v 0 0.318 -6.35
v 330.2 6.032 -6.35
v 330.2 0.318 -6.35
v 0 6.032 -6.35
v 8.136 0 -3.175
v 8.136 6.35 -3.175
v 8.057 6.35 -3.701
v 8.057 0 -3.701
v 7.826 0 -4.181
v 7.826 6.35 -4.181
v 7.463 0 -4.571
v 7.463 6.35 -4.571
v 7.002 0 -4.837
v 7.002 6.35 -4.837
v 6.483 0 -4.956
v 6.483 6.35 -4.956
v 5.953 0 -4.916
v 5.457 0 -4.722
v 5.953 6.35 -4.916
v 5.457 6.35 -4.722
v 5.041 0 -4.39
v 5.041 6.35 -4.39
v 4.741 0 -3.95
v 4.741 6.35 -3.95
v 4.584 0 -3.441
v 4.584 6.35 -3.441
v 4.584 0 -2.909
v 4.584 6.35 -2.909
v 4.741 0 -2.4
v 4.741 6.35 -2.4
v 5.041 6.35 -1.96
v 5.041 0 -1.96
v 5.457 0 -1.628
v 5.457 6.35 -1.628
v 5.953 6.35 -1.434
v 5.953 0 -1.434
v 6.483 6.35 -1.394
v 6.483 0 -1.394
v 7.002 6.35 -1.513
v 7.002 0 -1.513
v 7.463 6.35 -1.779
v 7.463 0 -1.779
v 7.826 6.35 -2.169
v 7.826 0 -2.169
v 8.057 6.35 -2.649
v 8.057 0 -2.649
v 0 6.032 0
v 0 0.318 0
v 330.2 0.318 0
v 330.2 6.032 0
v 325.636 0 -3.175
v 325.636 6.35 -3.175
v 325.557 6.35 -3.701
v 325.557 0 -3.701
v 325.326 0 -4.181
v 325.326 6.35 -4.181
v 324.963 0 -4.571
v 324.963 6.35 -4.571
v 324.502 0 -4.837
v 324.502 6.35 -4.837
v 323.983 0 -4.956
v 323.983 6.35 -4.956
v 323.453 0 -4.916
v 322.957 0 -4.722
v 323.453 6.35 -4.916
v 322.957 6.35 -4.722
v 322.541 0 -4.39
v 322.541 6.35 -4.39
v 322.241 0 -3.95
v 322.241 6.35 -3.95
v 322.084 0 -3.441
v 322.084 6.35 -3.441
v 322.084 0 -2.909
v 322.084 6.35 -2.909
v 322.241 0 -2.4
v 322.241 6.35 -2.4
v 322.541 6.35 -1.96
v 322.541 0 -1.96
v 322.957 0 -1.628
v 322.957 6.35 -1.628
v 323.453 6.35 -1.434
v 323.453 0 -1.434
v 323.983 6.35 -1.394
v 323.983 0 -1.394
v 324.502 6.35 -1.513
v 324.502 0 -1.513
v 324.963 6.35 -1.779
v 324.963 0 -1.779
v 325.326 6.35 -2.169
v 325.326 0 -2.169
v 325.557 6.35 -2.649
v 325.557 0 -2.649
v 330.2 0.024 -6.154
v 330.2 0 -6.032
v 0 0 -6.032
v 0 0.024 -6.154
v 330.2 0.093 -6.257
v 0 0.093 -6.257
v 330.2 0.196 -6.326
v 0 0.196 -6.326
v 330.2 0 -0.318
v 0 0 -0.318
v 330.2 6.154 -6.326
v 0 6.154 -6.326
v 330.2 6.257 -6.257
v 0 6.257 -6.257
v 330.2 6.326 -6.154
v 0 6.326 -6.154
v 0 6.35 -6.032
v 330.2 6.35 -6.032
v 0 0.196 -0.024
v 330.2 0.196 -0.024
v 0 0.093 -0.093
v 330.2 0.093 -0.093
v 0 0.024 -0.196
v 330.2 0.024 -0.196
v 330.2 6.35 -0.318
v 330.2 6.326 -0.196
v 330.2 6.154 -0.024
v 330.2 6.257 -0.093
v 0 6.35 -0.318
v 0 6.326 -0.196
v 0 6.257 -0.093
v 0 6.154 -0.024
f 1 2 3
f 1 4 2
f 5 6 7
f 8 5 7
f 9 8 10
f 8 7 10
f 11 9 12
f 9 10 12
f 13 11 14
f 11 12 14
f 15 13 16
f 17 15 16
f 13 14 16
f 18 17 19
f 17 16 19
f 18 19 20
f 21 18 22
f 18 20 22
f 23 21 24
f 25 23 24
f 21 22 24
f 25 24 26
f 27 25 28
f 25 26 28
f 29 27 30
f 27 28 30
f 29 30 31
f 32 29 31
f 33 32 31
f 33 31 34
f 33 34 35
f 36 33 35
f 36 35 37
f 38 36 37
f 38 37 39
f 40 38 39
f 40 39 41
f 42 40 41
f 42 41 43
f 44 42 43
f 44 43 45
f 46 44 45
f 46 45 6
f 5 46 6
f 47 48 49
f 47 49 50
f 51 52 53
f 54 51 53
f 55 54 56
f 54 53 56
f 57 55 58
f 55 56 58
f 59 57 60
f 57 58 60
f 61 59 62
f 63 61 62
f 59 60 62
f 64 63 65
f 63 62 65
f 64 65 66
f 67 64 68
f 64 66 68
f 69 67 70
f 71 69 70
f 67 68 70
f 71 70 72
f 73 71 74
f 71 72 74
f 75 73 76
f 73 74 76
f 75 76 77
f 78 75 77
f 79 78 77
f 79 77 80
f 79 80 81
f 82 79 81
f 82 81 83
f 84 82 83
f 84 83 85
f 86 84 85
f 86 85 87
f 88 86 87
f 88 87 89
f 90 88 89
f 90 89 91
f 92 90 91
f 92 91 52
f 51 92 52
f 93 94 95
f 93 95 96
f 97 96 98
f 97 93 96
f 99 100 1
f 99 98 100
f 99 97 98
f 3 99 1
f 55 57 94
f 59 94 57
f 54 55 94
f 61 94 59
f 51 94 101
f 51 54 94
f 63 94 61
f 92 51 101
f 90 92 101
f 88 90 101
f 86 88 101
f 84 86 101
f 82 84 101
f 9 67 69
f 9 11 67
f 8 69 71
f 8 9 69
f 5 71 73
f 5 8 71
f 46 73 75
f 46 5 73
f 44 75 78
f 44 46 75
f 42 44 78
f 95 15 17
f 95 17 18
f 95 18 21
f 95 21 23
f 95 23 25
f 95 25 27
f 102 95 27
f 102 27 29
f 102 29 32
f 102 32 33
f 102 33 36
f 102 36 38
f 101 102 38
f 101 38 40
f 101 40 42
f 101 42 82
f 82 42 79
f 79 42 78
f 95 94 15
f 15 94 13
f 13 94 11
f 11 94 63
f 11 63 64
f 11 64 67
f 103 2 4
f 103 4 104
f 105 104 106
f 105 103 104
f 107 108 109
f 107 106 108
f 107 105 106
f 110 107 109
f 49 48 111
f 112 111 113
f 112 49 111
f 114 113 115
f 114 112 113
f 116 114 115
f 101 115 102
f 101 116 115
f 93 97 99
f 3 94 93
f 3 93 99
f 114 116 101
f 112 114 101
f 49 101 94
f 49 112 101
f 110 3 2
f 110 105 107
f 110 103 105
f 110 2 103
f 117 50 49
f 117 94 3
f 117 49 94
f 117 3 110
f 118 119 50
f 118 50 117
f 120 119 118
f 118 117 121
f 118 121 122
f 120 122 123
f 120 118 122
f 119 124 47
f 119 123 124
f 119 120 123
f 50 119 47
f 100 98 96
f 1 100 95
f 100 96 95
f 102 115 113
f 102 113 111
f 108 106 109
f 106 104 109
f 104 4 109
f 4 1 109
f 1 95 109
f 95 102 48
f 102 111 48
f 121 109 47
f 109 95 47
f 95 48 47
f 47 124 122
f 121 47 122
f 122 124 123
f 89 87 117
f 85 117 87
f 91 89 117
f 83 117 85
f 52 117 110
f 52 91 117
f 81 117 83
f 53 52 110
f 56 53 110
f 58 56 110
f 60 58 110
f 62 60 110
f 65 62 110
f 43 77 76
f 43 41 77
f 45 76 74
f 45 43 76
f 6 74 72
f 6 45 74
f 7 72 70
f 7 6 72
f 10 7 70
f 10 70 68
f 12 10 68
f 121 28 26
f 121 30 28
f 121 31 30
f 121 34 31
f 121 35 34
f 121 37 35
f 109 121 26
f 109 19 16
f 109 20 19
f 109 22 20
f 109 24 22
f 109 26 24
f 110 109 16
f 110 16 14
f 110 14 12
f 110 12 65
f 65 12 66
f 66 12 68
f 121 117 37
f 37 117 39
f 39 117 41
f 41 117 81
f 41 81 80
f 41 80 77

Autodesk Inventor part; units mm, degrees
ref_plane "YZ Plane" through (0, 0, 0) normal (1, 0, 0) x (0, 1, 0)
ref_plane "XZ Plane" through (0, 0, 0) normal (0, 1, 0) x (-1, 0, 0)
ref_plane "XY Plane" through (0, 0, 0) normal (0, 0, 1) x (1, 0, 0)
sketch "Sketch1" plane through (0, 0, 0) normal (1, 0, 0) x (0, 1, 0)
  line L0 (0, 0) -> (6.35, 0)
  line L1 (6.35, 0) -> (6.35, -6.35)
  line L2 (6.35, -6.35) -> (0, -6.35)
  line L3 (0, -6.35) -> (0, 0)
  dimension "d0" = 6.35
  dimension "d1" = 6.35
extrude "Extrusion1" add sketch "Sketch1" along normal blind 330.2
fillet "Fillet1" radius 0.3175 4 edges at (165.1, 6.35, 0) (165.1, 6.35, -6.35) (165.1, 0, -6.35) (165.1, 0, 0)
sketch "Sketch2" plane through (0, 6.35, -6.0325) normal (0, 1, 0) x (1, 0, 0)
  circle A0 centre (6.35, -2.8575) radius 1.7859
  line L0 (0, 0) -> (0, -5.715) projected
  circle A1 centre (323.85, -2.8575) radius 1.7859
  line L1 (330.2, 0) -> (330.2, -5.715) projected
  point P0 (0, -6.0325)
  dimension "d5" = 3.5719
  dimension "d6" = 6.35
  dimension "d7" = 3.5719
  dimension "d8" = 6.35
extrude "Extrusion2" cut sketch "Sketch2" against normal blind 6.35
thread "Thread1" size "8-32 UNC" class "2B" standard "ANSI Unified Screw Threads" full length
thread "Thread2" size "8-32 UNC" class "2B" standard "ANSI Unified Screw Threads" full length
properties part number "Scraper Cross Brace"
